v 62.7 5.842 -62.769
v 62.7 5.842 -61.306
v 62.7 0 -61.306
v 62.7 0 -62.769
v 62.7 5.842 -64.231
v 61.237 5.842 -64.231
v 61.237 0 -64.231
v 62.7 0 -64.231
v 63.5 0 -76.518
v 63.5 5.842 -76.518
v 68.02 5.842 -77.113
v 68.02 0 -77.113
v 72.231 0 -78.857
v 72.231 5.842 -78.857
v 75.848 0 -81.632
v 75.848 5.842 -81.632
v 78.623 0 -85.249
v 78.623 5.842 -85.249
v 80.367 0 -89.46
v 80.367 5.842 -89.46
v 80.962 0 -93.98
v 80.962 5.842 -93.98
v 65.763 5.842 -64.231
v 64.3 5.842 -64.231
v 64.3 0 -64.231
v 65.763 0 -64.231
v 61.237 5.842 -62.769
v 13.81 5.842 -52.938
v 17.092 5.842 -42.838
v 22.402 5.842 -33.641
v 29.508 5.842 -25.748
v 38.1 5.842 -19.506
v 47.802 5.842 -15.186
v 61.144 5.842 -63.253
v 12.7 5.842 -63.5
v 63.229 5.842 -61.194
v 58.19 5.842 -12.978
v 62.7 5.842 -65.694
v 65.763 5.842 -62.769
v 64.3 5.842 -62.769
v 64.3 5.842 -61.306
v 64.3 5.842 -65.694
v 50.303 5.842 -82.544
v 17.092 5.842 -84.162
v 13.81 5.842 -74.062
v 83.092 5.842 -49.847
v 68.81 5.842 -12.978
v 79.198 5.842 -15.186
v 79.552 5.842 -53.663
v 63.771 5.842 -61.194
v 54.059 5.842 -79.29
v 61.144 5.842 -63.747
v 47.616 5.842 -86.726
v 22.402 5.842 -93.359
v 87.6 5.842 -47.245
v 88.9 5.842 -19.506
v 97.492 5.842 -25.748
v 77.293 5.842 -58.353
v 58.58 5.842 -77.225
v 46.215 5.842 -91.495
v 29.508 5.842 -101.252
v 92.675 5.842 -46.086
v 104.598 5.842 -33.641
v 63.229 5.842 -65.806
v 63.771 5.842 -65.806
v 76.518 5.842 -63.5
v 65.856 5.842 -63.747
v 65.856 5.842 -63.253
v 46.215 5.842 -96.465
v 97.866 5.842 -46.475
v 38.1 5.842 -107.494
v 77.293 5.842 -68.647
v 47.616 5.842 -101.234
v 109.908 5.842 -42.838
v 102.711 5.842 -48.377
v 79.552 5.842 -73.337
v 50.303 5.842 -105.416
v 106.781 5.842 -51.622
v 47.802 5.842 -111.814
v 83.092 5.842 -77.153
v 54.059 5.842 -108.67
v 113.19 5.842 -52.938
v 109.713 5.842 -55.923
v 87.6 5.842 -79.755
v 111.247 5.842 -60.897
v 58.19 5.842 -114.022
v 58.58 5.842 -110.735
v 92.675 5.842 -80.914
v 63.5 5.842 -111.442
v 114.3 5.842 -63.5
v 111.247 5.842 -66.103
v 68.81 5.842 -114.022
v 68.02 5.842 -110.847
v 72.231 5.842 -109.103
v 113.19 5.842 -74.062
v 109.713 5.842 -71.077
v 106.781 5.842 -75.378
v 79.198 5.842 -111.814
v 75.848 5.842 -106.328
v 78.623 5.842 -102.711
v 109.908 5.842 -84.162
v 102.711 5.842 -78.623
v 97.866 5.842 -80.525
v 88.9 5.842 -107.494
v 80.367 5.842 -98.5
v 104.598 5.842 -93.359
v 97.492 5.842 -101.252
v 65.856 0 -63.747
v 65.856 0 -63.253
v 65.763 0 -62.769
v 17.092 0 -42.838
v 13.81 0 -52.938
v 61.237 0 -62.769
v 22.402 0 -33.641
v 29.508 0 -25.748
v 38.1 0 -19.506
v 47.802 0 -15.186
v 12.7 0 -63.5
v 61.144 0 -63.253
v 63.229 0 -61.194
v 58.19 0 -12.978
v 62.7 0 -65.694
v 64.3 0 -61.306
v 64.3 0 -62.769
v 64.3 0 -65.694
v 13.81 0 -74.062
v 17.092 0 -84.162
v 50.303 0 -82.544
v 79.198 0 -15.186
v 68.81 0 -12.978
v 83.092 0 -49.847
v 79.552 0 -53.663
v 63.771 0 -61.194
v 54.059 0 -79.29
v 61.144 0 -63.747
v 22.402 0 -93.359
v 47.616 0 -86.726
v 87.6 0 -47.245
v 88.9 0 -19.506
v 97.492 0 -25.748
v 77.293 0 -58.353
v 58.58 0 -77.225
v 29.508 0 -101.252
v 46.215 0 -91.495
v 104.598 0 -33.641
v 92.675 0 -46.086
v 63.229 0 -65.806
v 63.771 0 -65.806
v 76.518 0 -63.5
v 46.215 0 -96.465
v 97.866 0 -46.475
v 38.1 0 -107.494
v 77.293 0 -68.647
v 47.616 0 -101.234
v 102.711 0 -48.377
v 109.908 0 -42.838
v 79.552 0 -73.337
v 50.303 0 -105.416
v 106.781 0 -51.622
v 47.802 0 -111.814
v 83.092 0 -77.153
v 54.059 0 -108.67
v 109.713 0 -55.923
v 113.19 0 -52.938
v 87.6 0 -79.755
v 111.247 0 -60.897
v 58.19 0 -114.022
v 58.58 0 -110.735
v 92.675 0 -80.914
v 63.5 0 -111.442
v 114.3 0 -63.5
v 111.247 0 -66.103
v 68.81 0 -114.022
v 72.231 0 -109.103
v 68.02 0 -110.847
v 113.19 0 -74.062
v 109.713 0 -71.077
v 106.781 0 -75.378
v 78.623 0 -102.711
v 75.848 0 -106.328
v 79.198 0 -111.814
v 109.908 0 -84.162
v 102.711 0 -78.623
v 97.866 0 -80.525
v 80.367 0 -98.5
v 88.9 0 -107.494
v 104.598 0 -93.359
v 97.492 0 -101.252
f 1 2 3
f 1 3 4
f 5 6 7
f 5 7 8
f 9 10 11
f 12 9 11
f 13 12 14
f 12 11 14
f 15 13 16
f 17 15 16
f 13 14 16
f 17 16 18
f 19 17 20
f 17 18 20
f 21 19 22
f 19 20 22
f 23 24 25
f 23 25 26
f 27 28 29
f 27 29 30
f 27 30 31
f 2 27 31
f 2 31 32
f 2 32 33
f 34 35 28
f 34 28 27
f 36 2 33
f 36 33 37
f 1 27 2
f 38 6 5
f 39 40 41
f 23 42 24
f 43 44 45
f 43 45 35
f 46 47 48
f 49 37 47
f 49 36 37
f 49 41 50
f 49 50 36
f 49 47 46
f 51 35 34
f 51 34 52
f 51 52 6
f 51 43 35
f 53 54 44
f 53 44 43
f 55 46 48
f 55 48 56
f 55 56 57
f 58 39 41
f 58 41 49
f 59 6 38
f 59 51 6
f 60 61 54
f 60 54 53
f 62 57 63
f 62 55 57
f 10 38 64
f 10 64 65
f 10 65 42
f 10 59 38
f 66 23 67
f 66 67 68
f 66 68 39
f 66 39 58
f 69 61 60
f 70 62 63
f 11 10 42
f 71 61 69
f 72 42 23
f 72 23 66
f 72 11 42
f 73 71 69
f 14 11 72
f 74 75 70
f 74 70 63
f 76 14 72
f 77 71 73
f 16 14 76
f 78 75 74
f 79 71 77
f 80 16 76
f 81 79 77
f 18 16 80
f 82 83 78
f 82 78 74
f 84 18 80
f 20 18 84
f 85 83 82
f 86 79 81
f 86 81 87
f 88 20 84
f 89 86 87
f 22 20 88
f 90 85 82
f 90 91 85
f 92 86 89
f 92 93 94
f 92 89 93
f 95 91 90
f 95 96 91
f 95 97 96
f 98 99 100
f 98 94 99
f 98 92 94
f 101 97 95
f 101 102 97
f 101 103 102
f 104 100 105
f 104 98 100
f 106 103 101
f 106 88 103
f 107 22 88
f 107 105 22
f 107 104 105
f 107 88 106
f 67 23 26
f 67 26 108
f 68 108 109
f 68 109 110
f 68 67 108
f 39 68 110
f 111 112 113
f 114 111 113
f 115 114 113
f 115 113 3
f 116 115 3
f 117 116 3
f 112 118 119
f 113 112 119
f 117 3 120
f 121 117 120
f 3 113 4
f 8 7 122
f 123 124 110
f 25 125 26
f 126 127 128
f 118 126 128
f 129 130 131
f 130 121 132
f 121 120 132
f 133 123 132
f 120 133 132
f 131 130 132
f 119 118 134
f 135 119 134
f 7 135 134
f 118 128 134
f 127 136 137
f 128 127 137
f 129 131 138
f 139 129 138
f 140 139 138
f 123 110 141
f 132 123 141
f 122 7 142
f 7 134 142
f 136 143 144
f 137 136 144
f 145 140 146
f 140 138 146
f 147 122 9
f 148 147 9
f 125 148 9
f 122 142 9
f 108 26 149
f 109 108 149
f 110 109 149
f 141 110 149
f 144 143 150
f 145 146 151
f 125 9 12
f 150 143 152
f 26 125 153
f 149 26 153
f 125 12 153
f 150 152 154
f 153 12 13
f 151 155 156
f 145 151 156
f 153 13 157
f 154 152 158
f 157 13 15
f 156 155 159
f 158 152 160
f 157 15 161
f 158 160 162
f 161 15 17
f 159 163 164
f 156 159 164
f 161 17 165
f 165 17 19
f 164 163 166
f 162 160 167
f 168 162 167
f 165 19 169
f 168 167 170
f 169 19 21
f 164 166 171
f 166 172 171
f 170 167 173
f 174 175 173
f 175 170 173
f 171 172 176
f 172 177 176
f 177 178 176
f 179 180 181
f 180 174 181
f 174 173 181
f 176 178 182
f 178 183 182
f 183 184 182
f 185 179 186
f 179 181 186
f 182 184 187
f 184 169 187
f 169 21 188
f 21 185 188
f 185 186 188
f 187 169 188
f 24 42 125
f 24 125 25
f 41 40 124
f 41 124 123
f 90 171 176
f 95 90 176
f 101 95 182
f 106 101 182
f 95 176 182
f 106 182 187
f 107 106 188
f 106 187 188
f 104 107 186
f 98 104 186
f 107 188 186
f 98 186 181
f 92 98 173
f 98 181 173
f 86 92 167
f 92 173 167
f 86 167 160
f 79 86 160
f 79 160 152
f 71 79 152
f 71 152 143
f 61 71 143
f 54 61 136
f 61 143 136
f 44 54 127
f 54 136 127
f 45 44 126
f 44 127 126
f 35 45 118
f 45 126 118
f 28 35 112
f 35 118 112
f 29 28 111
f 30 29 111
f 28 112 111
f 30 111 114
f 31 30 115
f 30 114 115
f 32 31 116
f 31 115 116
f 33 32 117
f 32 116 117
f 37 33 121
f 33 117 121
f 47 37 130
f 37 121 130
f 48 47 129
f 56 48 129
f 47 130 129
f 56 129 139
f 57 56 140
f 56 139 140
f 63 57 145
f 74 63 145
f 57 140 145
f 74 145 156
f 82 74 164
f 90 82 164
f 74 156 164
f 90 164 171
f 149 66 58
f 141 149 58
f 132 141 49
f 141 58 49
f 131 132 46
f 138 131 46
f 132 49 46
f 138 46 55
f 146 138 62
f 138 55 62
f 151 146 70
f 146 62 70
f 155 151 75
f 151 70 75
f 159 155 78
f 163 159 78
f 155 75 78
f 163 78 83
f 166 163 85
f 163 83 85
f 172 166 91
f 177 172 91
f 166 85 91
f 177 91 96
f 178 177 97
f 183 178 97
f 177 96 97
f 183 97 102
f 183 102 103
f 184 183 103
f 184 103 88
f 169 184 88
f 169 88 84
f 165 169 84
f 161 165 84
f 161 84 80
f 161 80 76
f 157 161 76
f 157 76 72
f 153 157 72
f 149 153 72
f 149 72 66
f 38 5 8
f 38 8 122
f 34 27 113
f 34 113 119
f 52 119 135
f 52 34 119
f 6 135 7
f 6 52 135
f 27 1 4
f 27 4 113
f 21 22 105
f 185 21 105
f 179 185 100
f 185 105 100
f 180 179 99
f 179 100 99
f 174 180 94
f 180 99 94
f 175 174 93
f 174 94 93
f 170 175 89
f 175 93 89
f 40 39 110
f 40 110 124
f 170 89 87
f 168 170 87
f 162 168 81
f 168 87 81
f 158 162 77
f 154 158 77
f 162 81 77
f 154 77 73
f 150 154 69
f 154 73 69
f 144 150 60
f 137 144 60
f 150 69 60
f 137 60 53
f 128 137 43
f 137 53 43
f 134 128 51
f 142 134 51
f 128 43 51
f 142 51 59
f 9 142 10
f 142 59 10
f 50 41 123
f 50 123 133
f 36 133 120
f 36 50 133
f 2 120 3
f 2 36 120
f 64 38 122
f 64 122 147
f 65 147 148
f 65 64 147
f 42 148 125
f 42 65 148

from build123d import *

# Parameters (mm, degrees)
SKETCH6_R           = 50.8
BOSS_EXTRUDE3_DEPTH = 5.842
CUT_EXTRUDE2_DEPTH  = 6.842
SKETCH12_R          = 2.75
CUT_EXTRUDE3_DEPTH  = 6.842
SKETCH12_3_R        = 2.75
BOSS_EXTRUDE4_DEPTH = 5.842


with BuildPart() as part:
    # Sketch6 → Boss-Extrude3 (new body)
    with BuildSketch(Plane(origin=(0, 0, 0), x_dir=(1, 0, 0), z_dir=(0, 1, 0))):
        with Locations((63.5, 63.5)):
            Circle(SKETCH6_R)
    extrude(amount=BOSS_EXTRUDE3_DEPTH)

    # Sketch11 → Cut-Extrude2 (cut, through all)
    with BuildSketch(Plane(origin=(0, 5.842, 0), x_dir=(1, 0, 0), z_dir=(0, 1, 0))):
        with BuildLine():
            ThreePointArc((80.9625, 93.98), (75.847852166, 106.327852166), (63.5, 111.4425))
            Line((63.5, 111.4425), (63.5, 76.5175))
            ThreePointArc((63.5, 76.5175), (75.847852166, 81.632147834), (80.9625, 93.98))
        make_face()
        with BuildLine():
            Line((63.5, 76.5175), (63.5, 111.4425))
            ThreePointArc((63.5, 111.4425), (46.0375, 93.98), (63.5, 76.5175))
        make_face()
        with BuildLine():
            ThreePointArc((111.4425, 63.5), (93.98, 80.9625), (76.5175, 63.5))
            Line((76.5175, 63.5), (111.4425, 63.5))
        make_face()
        with BuildLine():
            Line((111.4425, 63.5), (76.5175, 63.5))
            ThreePointArc((76.5175, 63.5), (93.98, 46.0375), (111.4425, 63.5))
        make_face()
    extrude(amount=-CUT_EXTRUDE2_DEPTH, mode=Mode.SUBTRACT)

    # Sketch12 → Cut-Extrude3 (cut, through all)
    with BuildSketch(Plane(origin=(0, 5.842, 0), x_dir=(1, 0, 0), z_dir=(0, 1, 0))):
        with Locations((63.5, 63.5)):
            Circle(SKETCH12_R)
    extrude(amount=-CUT_EXTRUDE3_DEPTH, mode=Mode.SUBTRACT)

    # Sketch12<3> → Boss-Extrude4 (add)
    with BuildSketch(Plane(origin=(0, 5.842, 0), x_dir=(1, 0, 0), z_dir=(0, 1, 0))):
        with Locations((63.5, 63.5)):
            Circle(SKETCH12_3_R)
        with BuildLine():
            Line((62.7, 64.23137085), (62.7, 65.69411255))
            ThreePointArc((62.7, 65.69411255), (63.5, 65.820249175), (64.3, 65.69411255))
            Line((64.3, 65.69411255), (64.3, 64.23137085))
            Line((64.3, 64.23137085), (65.7627417, 64.23137085))
            ThreePointArc((65.7627417, 64.23137085), (65.867727335, 63.5), (65.7627417, 62.76862915))
            Line((65.7627417, 62.76862915), (64.3, 62.76862915))
            Line((64.3, 62.76862915), (64.3, 61.30588745))
            ThreePointArc((64.3, 61.30588745), (63.5, 61.179750825), (62.7, 61.30588745))
            Line((62.7, 61.30588745), (62.7, 62.76862915))
            Line((62.7, 62.76862915), (61.2372583, 62.76862915))
            ThreePointArc((61.2372583, 62.76862915), (61.132272665, 63.5), (61.2372583, 64.23137085))
            Line((61.2372583, 64.23137085), (62.7, 64.23137085))
        make_face(mode=Mode.SUBTRACT)
    extrude(amount=-BOSS_EXTRUDE4_DEPTH)


solid = part.part
